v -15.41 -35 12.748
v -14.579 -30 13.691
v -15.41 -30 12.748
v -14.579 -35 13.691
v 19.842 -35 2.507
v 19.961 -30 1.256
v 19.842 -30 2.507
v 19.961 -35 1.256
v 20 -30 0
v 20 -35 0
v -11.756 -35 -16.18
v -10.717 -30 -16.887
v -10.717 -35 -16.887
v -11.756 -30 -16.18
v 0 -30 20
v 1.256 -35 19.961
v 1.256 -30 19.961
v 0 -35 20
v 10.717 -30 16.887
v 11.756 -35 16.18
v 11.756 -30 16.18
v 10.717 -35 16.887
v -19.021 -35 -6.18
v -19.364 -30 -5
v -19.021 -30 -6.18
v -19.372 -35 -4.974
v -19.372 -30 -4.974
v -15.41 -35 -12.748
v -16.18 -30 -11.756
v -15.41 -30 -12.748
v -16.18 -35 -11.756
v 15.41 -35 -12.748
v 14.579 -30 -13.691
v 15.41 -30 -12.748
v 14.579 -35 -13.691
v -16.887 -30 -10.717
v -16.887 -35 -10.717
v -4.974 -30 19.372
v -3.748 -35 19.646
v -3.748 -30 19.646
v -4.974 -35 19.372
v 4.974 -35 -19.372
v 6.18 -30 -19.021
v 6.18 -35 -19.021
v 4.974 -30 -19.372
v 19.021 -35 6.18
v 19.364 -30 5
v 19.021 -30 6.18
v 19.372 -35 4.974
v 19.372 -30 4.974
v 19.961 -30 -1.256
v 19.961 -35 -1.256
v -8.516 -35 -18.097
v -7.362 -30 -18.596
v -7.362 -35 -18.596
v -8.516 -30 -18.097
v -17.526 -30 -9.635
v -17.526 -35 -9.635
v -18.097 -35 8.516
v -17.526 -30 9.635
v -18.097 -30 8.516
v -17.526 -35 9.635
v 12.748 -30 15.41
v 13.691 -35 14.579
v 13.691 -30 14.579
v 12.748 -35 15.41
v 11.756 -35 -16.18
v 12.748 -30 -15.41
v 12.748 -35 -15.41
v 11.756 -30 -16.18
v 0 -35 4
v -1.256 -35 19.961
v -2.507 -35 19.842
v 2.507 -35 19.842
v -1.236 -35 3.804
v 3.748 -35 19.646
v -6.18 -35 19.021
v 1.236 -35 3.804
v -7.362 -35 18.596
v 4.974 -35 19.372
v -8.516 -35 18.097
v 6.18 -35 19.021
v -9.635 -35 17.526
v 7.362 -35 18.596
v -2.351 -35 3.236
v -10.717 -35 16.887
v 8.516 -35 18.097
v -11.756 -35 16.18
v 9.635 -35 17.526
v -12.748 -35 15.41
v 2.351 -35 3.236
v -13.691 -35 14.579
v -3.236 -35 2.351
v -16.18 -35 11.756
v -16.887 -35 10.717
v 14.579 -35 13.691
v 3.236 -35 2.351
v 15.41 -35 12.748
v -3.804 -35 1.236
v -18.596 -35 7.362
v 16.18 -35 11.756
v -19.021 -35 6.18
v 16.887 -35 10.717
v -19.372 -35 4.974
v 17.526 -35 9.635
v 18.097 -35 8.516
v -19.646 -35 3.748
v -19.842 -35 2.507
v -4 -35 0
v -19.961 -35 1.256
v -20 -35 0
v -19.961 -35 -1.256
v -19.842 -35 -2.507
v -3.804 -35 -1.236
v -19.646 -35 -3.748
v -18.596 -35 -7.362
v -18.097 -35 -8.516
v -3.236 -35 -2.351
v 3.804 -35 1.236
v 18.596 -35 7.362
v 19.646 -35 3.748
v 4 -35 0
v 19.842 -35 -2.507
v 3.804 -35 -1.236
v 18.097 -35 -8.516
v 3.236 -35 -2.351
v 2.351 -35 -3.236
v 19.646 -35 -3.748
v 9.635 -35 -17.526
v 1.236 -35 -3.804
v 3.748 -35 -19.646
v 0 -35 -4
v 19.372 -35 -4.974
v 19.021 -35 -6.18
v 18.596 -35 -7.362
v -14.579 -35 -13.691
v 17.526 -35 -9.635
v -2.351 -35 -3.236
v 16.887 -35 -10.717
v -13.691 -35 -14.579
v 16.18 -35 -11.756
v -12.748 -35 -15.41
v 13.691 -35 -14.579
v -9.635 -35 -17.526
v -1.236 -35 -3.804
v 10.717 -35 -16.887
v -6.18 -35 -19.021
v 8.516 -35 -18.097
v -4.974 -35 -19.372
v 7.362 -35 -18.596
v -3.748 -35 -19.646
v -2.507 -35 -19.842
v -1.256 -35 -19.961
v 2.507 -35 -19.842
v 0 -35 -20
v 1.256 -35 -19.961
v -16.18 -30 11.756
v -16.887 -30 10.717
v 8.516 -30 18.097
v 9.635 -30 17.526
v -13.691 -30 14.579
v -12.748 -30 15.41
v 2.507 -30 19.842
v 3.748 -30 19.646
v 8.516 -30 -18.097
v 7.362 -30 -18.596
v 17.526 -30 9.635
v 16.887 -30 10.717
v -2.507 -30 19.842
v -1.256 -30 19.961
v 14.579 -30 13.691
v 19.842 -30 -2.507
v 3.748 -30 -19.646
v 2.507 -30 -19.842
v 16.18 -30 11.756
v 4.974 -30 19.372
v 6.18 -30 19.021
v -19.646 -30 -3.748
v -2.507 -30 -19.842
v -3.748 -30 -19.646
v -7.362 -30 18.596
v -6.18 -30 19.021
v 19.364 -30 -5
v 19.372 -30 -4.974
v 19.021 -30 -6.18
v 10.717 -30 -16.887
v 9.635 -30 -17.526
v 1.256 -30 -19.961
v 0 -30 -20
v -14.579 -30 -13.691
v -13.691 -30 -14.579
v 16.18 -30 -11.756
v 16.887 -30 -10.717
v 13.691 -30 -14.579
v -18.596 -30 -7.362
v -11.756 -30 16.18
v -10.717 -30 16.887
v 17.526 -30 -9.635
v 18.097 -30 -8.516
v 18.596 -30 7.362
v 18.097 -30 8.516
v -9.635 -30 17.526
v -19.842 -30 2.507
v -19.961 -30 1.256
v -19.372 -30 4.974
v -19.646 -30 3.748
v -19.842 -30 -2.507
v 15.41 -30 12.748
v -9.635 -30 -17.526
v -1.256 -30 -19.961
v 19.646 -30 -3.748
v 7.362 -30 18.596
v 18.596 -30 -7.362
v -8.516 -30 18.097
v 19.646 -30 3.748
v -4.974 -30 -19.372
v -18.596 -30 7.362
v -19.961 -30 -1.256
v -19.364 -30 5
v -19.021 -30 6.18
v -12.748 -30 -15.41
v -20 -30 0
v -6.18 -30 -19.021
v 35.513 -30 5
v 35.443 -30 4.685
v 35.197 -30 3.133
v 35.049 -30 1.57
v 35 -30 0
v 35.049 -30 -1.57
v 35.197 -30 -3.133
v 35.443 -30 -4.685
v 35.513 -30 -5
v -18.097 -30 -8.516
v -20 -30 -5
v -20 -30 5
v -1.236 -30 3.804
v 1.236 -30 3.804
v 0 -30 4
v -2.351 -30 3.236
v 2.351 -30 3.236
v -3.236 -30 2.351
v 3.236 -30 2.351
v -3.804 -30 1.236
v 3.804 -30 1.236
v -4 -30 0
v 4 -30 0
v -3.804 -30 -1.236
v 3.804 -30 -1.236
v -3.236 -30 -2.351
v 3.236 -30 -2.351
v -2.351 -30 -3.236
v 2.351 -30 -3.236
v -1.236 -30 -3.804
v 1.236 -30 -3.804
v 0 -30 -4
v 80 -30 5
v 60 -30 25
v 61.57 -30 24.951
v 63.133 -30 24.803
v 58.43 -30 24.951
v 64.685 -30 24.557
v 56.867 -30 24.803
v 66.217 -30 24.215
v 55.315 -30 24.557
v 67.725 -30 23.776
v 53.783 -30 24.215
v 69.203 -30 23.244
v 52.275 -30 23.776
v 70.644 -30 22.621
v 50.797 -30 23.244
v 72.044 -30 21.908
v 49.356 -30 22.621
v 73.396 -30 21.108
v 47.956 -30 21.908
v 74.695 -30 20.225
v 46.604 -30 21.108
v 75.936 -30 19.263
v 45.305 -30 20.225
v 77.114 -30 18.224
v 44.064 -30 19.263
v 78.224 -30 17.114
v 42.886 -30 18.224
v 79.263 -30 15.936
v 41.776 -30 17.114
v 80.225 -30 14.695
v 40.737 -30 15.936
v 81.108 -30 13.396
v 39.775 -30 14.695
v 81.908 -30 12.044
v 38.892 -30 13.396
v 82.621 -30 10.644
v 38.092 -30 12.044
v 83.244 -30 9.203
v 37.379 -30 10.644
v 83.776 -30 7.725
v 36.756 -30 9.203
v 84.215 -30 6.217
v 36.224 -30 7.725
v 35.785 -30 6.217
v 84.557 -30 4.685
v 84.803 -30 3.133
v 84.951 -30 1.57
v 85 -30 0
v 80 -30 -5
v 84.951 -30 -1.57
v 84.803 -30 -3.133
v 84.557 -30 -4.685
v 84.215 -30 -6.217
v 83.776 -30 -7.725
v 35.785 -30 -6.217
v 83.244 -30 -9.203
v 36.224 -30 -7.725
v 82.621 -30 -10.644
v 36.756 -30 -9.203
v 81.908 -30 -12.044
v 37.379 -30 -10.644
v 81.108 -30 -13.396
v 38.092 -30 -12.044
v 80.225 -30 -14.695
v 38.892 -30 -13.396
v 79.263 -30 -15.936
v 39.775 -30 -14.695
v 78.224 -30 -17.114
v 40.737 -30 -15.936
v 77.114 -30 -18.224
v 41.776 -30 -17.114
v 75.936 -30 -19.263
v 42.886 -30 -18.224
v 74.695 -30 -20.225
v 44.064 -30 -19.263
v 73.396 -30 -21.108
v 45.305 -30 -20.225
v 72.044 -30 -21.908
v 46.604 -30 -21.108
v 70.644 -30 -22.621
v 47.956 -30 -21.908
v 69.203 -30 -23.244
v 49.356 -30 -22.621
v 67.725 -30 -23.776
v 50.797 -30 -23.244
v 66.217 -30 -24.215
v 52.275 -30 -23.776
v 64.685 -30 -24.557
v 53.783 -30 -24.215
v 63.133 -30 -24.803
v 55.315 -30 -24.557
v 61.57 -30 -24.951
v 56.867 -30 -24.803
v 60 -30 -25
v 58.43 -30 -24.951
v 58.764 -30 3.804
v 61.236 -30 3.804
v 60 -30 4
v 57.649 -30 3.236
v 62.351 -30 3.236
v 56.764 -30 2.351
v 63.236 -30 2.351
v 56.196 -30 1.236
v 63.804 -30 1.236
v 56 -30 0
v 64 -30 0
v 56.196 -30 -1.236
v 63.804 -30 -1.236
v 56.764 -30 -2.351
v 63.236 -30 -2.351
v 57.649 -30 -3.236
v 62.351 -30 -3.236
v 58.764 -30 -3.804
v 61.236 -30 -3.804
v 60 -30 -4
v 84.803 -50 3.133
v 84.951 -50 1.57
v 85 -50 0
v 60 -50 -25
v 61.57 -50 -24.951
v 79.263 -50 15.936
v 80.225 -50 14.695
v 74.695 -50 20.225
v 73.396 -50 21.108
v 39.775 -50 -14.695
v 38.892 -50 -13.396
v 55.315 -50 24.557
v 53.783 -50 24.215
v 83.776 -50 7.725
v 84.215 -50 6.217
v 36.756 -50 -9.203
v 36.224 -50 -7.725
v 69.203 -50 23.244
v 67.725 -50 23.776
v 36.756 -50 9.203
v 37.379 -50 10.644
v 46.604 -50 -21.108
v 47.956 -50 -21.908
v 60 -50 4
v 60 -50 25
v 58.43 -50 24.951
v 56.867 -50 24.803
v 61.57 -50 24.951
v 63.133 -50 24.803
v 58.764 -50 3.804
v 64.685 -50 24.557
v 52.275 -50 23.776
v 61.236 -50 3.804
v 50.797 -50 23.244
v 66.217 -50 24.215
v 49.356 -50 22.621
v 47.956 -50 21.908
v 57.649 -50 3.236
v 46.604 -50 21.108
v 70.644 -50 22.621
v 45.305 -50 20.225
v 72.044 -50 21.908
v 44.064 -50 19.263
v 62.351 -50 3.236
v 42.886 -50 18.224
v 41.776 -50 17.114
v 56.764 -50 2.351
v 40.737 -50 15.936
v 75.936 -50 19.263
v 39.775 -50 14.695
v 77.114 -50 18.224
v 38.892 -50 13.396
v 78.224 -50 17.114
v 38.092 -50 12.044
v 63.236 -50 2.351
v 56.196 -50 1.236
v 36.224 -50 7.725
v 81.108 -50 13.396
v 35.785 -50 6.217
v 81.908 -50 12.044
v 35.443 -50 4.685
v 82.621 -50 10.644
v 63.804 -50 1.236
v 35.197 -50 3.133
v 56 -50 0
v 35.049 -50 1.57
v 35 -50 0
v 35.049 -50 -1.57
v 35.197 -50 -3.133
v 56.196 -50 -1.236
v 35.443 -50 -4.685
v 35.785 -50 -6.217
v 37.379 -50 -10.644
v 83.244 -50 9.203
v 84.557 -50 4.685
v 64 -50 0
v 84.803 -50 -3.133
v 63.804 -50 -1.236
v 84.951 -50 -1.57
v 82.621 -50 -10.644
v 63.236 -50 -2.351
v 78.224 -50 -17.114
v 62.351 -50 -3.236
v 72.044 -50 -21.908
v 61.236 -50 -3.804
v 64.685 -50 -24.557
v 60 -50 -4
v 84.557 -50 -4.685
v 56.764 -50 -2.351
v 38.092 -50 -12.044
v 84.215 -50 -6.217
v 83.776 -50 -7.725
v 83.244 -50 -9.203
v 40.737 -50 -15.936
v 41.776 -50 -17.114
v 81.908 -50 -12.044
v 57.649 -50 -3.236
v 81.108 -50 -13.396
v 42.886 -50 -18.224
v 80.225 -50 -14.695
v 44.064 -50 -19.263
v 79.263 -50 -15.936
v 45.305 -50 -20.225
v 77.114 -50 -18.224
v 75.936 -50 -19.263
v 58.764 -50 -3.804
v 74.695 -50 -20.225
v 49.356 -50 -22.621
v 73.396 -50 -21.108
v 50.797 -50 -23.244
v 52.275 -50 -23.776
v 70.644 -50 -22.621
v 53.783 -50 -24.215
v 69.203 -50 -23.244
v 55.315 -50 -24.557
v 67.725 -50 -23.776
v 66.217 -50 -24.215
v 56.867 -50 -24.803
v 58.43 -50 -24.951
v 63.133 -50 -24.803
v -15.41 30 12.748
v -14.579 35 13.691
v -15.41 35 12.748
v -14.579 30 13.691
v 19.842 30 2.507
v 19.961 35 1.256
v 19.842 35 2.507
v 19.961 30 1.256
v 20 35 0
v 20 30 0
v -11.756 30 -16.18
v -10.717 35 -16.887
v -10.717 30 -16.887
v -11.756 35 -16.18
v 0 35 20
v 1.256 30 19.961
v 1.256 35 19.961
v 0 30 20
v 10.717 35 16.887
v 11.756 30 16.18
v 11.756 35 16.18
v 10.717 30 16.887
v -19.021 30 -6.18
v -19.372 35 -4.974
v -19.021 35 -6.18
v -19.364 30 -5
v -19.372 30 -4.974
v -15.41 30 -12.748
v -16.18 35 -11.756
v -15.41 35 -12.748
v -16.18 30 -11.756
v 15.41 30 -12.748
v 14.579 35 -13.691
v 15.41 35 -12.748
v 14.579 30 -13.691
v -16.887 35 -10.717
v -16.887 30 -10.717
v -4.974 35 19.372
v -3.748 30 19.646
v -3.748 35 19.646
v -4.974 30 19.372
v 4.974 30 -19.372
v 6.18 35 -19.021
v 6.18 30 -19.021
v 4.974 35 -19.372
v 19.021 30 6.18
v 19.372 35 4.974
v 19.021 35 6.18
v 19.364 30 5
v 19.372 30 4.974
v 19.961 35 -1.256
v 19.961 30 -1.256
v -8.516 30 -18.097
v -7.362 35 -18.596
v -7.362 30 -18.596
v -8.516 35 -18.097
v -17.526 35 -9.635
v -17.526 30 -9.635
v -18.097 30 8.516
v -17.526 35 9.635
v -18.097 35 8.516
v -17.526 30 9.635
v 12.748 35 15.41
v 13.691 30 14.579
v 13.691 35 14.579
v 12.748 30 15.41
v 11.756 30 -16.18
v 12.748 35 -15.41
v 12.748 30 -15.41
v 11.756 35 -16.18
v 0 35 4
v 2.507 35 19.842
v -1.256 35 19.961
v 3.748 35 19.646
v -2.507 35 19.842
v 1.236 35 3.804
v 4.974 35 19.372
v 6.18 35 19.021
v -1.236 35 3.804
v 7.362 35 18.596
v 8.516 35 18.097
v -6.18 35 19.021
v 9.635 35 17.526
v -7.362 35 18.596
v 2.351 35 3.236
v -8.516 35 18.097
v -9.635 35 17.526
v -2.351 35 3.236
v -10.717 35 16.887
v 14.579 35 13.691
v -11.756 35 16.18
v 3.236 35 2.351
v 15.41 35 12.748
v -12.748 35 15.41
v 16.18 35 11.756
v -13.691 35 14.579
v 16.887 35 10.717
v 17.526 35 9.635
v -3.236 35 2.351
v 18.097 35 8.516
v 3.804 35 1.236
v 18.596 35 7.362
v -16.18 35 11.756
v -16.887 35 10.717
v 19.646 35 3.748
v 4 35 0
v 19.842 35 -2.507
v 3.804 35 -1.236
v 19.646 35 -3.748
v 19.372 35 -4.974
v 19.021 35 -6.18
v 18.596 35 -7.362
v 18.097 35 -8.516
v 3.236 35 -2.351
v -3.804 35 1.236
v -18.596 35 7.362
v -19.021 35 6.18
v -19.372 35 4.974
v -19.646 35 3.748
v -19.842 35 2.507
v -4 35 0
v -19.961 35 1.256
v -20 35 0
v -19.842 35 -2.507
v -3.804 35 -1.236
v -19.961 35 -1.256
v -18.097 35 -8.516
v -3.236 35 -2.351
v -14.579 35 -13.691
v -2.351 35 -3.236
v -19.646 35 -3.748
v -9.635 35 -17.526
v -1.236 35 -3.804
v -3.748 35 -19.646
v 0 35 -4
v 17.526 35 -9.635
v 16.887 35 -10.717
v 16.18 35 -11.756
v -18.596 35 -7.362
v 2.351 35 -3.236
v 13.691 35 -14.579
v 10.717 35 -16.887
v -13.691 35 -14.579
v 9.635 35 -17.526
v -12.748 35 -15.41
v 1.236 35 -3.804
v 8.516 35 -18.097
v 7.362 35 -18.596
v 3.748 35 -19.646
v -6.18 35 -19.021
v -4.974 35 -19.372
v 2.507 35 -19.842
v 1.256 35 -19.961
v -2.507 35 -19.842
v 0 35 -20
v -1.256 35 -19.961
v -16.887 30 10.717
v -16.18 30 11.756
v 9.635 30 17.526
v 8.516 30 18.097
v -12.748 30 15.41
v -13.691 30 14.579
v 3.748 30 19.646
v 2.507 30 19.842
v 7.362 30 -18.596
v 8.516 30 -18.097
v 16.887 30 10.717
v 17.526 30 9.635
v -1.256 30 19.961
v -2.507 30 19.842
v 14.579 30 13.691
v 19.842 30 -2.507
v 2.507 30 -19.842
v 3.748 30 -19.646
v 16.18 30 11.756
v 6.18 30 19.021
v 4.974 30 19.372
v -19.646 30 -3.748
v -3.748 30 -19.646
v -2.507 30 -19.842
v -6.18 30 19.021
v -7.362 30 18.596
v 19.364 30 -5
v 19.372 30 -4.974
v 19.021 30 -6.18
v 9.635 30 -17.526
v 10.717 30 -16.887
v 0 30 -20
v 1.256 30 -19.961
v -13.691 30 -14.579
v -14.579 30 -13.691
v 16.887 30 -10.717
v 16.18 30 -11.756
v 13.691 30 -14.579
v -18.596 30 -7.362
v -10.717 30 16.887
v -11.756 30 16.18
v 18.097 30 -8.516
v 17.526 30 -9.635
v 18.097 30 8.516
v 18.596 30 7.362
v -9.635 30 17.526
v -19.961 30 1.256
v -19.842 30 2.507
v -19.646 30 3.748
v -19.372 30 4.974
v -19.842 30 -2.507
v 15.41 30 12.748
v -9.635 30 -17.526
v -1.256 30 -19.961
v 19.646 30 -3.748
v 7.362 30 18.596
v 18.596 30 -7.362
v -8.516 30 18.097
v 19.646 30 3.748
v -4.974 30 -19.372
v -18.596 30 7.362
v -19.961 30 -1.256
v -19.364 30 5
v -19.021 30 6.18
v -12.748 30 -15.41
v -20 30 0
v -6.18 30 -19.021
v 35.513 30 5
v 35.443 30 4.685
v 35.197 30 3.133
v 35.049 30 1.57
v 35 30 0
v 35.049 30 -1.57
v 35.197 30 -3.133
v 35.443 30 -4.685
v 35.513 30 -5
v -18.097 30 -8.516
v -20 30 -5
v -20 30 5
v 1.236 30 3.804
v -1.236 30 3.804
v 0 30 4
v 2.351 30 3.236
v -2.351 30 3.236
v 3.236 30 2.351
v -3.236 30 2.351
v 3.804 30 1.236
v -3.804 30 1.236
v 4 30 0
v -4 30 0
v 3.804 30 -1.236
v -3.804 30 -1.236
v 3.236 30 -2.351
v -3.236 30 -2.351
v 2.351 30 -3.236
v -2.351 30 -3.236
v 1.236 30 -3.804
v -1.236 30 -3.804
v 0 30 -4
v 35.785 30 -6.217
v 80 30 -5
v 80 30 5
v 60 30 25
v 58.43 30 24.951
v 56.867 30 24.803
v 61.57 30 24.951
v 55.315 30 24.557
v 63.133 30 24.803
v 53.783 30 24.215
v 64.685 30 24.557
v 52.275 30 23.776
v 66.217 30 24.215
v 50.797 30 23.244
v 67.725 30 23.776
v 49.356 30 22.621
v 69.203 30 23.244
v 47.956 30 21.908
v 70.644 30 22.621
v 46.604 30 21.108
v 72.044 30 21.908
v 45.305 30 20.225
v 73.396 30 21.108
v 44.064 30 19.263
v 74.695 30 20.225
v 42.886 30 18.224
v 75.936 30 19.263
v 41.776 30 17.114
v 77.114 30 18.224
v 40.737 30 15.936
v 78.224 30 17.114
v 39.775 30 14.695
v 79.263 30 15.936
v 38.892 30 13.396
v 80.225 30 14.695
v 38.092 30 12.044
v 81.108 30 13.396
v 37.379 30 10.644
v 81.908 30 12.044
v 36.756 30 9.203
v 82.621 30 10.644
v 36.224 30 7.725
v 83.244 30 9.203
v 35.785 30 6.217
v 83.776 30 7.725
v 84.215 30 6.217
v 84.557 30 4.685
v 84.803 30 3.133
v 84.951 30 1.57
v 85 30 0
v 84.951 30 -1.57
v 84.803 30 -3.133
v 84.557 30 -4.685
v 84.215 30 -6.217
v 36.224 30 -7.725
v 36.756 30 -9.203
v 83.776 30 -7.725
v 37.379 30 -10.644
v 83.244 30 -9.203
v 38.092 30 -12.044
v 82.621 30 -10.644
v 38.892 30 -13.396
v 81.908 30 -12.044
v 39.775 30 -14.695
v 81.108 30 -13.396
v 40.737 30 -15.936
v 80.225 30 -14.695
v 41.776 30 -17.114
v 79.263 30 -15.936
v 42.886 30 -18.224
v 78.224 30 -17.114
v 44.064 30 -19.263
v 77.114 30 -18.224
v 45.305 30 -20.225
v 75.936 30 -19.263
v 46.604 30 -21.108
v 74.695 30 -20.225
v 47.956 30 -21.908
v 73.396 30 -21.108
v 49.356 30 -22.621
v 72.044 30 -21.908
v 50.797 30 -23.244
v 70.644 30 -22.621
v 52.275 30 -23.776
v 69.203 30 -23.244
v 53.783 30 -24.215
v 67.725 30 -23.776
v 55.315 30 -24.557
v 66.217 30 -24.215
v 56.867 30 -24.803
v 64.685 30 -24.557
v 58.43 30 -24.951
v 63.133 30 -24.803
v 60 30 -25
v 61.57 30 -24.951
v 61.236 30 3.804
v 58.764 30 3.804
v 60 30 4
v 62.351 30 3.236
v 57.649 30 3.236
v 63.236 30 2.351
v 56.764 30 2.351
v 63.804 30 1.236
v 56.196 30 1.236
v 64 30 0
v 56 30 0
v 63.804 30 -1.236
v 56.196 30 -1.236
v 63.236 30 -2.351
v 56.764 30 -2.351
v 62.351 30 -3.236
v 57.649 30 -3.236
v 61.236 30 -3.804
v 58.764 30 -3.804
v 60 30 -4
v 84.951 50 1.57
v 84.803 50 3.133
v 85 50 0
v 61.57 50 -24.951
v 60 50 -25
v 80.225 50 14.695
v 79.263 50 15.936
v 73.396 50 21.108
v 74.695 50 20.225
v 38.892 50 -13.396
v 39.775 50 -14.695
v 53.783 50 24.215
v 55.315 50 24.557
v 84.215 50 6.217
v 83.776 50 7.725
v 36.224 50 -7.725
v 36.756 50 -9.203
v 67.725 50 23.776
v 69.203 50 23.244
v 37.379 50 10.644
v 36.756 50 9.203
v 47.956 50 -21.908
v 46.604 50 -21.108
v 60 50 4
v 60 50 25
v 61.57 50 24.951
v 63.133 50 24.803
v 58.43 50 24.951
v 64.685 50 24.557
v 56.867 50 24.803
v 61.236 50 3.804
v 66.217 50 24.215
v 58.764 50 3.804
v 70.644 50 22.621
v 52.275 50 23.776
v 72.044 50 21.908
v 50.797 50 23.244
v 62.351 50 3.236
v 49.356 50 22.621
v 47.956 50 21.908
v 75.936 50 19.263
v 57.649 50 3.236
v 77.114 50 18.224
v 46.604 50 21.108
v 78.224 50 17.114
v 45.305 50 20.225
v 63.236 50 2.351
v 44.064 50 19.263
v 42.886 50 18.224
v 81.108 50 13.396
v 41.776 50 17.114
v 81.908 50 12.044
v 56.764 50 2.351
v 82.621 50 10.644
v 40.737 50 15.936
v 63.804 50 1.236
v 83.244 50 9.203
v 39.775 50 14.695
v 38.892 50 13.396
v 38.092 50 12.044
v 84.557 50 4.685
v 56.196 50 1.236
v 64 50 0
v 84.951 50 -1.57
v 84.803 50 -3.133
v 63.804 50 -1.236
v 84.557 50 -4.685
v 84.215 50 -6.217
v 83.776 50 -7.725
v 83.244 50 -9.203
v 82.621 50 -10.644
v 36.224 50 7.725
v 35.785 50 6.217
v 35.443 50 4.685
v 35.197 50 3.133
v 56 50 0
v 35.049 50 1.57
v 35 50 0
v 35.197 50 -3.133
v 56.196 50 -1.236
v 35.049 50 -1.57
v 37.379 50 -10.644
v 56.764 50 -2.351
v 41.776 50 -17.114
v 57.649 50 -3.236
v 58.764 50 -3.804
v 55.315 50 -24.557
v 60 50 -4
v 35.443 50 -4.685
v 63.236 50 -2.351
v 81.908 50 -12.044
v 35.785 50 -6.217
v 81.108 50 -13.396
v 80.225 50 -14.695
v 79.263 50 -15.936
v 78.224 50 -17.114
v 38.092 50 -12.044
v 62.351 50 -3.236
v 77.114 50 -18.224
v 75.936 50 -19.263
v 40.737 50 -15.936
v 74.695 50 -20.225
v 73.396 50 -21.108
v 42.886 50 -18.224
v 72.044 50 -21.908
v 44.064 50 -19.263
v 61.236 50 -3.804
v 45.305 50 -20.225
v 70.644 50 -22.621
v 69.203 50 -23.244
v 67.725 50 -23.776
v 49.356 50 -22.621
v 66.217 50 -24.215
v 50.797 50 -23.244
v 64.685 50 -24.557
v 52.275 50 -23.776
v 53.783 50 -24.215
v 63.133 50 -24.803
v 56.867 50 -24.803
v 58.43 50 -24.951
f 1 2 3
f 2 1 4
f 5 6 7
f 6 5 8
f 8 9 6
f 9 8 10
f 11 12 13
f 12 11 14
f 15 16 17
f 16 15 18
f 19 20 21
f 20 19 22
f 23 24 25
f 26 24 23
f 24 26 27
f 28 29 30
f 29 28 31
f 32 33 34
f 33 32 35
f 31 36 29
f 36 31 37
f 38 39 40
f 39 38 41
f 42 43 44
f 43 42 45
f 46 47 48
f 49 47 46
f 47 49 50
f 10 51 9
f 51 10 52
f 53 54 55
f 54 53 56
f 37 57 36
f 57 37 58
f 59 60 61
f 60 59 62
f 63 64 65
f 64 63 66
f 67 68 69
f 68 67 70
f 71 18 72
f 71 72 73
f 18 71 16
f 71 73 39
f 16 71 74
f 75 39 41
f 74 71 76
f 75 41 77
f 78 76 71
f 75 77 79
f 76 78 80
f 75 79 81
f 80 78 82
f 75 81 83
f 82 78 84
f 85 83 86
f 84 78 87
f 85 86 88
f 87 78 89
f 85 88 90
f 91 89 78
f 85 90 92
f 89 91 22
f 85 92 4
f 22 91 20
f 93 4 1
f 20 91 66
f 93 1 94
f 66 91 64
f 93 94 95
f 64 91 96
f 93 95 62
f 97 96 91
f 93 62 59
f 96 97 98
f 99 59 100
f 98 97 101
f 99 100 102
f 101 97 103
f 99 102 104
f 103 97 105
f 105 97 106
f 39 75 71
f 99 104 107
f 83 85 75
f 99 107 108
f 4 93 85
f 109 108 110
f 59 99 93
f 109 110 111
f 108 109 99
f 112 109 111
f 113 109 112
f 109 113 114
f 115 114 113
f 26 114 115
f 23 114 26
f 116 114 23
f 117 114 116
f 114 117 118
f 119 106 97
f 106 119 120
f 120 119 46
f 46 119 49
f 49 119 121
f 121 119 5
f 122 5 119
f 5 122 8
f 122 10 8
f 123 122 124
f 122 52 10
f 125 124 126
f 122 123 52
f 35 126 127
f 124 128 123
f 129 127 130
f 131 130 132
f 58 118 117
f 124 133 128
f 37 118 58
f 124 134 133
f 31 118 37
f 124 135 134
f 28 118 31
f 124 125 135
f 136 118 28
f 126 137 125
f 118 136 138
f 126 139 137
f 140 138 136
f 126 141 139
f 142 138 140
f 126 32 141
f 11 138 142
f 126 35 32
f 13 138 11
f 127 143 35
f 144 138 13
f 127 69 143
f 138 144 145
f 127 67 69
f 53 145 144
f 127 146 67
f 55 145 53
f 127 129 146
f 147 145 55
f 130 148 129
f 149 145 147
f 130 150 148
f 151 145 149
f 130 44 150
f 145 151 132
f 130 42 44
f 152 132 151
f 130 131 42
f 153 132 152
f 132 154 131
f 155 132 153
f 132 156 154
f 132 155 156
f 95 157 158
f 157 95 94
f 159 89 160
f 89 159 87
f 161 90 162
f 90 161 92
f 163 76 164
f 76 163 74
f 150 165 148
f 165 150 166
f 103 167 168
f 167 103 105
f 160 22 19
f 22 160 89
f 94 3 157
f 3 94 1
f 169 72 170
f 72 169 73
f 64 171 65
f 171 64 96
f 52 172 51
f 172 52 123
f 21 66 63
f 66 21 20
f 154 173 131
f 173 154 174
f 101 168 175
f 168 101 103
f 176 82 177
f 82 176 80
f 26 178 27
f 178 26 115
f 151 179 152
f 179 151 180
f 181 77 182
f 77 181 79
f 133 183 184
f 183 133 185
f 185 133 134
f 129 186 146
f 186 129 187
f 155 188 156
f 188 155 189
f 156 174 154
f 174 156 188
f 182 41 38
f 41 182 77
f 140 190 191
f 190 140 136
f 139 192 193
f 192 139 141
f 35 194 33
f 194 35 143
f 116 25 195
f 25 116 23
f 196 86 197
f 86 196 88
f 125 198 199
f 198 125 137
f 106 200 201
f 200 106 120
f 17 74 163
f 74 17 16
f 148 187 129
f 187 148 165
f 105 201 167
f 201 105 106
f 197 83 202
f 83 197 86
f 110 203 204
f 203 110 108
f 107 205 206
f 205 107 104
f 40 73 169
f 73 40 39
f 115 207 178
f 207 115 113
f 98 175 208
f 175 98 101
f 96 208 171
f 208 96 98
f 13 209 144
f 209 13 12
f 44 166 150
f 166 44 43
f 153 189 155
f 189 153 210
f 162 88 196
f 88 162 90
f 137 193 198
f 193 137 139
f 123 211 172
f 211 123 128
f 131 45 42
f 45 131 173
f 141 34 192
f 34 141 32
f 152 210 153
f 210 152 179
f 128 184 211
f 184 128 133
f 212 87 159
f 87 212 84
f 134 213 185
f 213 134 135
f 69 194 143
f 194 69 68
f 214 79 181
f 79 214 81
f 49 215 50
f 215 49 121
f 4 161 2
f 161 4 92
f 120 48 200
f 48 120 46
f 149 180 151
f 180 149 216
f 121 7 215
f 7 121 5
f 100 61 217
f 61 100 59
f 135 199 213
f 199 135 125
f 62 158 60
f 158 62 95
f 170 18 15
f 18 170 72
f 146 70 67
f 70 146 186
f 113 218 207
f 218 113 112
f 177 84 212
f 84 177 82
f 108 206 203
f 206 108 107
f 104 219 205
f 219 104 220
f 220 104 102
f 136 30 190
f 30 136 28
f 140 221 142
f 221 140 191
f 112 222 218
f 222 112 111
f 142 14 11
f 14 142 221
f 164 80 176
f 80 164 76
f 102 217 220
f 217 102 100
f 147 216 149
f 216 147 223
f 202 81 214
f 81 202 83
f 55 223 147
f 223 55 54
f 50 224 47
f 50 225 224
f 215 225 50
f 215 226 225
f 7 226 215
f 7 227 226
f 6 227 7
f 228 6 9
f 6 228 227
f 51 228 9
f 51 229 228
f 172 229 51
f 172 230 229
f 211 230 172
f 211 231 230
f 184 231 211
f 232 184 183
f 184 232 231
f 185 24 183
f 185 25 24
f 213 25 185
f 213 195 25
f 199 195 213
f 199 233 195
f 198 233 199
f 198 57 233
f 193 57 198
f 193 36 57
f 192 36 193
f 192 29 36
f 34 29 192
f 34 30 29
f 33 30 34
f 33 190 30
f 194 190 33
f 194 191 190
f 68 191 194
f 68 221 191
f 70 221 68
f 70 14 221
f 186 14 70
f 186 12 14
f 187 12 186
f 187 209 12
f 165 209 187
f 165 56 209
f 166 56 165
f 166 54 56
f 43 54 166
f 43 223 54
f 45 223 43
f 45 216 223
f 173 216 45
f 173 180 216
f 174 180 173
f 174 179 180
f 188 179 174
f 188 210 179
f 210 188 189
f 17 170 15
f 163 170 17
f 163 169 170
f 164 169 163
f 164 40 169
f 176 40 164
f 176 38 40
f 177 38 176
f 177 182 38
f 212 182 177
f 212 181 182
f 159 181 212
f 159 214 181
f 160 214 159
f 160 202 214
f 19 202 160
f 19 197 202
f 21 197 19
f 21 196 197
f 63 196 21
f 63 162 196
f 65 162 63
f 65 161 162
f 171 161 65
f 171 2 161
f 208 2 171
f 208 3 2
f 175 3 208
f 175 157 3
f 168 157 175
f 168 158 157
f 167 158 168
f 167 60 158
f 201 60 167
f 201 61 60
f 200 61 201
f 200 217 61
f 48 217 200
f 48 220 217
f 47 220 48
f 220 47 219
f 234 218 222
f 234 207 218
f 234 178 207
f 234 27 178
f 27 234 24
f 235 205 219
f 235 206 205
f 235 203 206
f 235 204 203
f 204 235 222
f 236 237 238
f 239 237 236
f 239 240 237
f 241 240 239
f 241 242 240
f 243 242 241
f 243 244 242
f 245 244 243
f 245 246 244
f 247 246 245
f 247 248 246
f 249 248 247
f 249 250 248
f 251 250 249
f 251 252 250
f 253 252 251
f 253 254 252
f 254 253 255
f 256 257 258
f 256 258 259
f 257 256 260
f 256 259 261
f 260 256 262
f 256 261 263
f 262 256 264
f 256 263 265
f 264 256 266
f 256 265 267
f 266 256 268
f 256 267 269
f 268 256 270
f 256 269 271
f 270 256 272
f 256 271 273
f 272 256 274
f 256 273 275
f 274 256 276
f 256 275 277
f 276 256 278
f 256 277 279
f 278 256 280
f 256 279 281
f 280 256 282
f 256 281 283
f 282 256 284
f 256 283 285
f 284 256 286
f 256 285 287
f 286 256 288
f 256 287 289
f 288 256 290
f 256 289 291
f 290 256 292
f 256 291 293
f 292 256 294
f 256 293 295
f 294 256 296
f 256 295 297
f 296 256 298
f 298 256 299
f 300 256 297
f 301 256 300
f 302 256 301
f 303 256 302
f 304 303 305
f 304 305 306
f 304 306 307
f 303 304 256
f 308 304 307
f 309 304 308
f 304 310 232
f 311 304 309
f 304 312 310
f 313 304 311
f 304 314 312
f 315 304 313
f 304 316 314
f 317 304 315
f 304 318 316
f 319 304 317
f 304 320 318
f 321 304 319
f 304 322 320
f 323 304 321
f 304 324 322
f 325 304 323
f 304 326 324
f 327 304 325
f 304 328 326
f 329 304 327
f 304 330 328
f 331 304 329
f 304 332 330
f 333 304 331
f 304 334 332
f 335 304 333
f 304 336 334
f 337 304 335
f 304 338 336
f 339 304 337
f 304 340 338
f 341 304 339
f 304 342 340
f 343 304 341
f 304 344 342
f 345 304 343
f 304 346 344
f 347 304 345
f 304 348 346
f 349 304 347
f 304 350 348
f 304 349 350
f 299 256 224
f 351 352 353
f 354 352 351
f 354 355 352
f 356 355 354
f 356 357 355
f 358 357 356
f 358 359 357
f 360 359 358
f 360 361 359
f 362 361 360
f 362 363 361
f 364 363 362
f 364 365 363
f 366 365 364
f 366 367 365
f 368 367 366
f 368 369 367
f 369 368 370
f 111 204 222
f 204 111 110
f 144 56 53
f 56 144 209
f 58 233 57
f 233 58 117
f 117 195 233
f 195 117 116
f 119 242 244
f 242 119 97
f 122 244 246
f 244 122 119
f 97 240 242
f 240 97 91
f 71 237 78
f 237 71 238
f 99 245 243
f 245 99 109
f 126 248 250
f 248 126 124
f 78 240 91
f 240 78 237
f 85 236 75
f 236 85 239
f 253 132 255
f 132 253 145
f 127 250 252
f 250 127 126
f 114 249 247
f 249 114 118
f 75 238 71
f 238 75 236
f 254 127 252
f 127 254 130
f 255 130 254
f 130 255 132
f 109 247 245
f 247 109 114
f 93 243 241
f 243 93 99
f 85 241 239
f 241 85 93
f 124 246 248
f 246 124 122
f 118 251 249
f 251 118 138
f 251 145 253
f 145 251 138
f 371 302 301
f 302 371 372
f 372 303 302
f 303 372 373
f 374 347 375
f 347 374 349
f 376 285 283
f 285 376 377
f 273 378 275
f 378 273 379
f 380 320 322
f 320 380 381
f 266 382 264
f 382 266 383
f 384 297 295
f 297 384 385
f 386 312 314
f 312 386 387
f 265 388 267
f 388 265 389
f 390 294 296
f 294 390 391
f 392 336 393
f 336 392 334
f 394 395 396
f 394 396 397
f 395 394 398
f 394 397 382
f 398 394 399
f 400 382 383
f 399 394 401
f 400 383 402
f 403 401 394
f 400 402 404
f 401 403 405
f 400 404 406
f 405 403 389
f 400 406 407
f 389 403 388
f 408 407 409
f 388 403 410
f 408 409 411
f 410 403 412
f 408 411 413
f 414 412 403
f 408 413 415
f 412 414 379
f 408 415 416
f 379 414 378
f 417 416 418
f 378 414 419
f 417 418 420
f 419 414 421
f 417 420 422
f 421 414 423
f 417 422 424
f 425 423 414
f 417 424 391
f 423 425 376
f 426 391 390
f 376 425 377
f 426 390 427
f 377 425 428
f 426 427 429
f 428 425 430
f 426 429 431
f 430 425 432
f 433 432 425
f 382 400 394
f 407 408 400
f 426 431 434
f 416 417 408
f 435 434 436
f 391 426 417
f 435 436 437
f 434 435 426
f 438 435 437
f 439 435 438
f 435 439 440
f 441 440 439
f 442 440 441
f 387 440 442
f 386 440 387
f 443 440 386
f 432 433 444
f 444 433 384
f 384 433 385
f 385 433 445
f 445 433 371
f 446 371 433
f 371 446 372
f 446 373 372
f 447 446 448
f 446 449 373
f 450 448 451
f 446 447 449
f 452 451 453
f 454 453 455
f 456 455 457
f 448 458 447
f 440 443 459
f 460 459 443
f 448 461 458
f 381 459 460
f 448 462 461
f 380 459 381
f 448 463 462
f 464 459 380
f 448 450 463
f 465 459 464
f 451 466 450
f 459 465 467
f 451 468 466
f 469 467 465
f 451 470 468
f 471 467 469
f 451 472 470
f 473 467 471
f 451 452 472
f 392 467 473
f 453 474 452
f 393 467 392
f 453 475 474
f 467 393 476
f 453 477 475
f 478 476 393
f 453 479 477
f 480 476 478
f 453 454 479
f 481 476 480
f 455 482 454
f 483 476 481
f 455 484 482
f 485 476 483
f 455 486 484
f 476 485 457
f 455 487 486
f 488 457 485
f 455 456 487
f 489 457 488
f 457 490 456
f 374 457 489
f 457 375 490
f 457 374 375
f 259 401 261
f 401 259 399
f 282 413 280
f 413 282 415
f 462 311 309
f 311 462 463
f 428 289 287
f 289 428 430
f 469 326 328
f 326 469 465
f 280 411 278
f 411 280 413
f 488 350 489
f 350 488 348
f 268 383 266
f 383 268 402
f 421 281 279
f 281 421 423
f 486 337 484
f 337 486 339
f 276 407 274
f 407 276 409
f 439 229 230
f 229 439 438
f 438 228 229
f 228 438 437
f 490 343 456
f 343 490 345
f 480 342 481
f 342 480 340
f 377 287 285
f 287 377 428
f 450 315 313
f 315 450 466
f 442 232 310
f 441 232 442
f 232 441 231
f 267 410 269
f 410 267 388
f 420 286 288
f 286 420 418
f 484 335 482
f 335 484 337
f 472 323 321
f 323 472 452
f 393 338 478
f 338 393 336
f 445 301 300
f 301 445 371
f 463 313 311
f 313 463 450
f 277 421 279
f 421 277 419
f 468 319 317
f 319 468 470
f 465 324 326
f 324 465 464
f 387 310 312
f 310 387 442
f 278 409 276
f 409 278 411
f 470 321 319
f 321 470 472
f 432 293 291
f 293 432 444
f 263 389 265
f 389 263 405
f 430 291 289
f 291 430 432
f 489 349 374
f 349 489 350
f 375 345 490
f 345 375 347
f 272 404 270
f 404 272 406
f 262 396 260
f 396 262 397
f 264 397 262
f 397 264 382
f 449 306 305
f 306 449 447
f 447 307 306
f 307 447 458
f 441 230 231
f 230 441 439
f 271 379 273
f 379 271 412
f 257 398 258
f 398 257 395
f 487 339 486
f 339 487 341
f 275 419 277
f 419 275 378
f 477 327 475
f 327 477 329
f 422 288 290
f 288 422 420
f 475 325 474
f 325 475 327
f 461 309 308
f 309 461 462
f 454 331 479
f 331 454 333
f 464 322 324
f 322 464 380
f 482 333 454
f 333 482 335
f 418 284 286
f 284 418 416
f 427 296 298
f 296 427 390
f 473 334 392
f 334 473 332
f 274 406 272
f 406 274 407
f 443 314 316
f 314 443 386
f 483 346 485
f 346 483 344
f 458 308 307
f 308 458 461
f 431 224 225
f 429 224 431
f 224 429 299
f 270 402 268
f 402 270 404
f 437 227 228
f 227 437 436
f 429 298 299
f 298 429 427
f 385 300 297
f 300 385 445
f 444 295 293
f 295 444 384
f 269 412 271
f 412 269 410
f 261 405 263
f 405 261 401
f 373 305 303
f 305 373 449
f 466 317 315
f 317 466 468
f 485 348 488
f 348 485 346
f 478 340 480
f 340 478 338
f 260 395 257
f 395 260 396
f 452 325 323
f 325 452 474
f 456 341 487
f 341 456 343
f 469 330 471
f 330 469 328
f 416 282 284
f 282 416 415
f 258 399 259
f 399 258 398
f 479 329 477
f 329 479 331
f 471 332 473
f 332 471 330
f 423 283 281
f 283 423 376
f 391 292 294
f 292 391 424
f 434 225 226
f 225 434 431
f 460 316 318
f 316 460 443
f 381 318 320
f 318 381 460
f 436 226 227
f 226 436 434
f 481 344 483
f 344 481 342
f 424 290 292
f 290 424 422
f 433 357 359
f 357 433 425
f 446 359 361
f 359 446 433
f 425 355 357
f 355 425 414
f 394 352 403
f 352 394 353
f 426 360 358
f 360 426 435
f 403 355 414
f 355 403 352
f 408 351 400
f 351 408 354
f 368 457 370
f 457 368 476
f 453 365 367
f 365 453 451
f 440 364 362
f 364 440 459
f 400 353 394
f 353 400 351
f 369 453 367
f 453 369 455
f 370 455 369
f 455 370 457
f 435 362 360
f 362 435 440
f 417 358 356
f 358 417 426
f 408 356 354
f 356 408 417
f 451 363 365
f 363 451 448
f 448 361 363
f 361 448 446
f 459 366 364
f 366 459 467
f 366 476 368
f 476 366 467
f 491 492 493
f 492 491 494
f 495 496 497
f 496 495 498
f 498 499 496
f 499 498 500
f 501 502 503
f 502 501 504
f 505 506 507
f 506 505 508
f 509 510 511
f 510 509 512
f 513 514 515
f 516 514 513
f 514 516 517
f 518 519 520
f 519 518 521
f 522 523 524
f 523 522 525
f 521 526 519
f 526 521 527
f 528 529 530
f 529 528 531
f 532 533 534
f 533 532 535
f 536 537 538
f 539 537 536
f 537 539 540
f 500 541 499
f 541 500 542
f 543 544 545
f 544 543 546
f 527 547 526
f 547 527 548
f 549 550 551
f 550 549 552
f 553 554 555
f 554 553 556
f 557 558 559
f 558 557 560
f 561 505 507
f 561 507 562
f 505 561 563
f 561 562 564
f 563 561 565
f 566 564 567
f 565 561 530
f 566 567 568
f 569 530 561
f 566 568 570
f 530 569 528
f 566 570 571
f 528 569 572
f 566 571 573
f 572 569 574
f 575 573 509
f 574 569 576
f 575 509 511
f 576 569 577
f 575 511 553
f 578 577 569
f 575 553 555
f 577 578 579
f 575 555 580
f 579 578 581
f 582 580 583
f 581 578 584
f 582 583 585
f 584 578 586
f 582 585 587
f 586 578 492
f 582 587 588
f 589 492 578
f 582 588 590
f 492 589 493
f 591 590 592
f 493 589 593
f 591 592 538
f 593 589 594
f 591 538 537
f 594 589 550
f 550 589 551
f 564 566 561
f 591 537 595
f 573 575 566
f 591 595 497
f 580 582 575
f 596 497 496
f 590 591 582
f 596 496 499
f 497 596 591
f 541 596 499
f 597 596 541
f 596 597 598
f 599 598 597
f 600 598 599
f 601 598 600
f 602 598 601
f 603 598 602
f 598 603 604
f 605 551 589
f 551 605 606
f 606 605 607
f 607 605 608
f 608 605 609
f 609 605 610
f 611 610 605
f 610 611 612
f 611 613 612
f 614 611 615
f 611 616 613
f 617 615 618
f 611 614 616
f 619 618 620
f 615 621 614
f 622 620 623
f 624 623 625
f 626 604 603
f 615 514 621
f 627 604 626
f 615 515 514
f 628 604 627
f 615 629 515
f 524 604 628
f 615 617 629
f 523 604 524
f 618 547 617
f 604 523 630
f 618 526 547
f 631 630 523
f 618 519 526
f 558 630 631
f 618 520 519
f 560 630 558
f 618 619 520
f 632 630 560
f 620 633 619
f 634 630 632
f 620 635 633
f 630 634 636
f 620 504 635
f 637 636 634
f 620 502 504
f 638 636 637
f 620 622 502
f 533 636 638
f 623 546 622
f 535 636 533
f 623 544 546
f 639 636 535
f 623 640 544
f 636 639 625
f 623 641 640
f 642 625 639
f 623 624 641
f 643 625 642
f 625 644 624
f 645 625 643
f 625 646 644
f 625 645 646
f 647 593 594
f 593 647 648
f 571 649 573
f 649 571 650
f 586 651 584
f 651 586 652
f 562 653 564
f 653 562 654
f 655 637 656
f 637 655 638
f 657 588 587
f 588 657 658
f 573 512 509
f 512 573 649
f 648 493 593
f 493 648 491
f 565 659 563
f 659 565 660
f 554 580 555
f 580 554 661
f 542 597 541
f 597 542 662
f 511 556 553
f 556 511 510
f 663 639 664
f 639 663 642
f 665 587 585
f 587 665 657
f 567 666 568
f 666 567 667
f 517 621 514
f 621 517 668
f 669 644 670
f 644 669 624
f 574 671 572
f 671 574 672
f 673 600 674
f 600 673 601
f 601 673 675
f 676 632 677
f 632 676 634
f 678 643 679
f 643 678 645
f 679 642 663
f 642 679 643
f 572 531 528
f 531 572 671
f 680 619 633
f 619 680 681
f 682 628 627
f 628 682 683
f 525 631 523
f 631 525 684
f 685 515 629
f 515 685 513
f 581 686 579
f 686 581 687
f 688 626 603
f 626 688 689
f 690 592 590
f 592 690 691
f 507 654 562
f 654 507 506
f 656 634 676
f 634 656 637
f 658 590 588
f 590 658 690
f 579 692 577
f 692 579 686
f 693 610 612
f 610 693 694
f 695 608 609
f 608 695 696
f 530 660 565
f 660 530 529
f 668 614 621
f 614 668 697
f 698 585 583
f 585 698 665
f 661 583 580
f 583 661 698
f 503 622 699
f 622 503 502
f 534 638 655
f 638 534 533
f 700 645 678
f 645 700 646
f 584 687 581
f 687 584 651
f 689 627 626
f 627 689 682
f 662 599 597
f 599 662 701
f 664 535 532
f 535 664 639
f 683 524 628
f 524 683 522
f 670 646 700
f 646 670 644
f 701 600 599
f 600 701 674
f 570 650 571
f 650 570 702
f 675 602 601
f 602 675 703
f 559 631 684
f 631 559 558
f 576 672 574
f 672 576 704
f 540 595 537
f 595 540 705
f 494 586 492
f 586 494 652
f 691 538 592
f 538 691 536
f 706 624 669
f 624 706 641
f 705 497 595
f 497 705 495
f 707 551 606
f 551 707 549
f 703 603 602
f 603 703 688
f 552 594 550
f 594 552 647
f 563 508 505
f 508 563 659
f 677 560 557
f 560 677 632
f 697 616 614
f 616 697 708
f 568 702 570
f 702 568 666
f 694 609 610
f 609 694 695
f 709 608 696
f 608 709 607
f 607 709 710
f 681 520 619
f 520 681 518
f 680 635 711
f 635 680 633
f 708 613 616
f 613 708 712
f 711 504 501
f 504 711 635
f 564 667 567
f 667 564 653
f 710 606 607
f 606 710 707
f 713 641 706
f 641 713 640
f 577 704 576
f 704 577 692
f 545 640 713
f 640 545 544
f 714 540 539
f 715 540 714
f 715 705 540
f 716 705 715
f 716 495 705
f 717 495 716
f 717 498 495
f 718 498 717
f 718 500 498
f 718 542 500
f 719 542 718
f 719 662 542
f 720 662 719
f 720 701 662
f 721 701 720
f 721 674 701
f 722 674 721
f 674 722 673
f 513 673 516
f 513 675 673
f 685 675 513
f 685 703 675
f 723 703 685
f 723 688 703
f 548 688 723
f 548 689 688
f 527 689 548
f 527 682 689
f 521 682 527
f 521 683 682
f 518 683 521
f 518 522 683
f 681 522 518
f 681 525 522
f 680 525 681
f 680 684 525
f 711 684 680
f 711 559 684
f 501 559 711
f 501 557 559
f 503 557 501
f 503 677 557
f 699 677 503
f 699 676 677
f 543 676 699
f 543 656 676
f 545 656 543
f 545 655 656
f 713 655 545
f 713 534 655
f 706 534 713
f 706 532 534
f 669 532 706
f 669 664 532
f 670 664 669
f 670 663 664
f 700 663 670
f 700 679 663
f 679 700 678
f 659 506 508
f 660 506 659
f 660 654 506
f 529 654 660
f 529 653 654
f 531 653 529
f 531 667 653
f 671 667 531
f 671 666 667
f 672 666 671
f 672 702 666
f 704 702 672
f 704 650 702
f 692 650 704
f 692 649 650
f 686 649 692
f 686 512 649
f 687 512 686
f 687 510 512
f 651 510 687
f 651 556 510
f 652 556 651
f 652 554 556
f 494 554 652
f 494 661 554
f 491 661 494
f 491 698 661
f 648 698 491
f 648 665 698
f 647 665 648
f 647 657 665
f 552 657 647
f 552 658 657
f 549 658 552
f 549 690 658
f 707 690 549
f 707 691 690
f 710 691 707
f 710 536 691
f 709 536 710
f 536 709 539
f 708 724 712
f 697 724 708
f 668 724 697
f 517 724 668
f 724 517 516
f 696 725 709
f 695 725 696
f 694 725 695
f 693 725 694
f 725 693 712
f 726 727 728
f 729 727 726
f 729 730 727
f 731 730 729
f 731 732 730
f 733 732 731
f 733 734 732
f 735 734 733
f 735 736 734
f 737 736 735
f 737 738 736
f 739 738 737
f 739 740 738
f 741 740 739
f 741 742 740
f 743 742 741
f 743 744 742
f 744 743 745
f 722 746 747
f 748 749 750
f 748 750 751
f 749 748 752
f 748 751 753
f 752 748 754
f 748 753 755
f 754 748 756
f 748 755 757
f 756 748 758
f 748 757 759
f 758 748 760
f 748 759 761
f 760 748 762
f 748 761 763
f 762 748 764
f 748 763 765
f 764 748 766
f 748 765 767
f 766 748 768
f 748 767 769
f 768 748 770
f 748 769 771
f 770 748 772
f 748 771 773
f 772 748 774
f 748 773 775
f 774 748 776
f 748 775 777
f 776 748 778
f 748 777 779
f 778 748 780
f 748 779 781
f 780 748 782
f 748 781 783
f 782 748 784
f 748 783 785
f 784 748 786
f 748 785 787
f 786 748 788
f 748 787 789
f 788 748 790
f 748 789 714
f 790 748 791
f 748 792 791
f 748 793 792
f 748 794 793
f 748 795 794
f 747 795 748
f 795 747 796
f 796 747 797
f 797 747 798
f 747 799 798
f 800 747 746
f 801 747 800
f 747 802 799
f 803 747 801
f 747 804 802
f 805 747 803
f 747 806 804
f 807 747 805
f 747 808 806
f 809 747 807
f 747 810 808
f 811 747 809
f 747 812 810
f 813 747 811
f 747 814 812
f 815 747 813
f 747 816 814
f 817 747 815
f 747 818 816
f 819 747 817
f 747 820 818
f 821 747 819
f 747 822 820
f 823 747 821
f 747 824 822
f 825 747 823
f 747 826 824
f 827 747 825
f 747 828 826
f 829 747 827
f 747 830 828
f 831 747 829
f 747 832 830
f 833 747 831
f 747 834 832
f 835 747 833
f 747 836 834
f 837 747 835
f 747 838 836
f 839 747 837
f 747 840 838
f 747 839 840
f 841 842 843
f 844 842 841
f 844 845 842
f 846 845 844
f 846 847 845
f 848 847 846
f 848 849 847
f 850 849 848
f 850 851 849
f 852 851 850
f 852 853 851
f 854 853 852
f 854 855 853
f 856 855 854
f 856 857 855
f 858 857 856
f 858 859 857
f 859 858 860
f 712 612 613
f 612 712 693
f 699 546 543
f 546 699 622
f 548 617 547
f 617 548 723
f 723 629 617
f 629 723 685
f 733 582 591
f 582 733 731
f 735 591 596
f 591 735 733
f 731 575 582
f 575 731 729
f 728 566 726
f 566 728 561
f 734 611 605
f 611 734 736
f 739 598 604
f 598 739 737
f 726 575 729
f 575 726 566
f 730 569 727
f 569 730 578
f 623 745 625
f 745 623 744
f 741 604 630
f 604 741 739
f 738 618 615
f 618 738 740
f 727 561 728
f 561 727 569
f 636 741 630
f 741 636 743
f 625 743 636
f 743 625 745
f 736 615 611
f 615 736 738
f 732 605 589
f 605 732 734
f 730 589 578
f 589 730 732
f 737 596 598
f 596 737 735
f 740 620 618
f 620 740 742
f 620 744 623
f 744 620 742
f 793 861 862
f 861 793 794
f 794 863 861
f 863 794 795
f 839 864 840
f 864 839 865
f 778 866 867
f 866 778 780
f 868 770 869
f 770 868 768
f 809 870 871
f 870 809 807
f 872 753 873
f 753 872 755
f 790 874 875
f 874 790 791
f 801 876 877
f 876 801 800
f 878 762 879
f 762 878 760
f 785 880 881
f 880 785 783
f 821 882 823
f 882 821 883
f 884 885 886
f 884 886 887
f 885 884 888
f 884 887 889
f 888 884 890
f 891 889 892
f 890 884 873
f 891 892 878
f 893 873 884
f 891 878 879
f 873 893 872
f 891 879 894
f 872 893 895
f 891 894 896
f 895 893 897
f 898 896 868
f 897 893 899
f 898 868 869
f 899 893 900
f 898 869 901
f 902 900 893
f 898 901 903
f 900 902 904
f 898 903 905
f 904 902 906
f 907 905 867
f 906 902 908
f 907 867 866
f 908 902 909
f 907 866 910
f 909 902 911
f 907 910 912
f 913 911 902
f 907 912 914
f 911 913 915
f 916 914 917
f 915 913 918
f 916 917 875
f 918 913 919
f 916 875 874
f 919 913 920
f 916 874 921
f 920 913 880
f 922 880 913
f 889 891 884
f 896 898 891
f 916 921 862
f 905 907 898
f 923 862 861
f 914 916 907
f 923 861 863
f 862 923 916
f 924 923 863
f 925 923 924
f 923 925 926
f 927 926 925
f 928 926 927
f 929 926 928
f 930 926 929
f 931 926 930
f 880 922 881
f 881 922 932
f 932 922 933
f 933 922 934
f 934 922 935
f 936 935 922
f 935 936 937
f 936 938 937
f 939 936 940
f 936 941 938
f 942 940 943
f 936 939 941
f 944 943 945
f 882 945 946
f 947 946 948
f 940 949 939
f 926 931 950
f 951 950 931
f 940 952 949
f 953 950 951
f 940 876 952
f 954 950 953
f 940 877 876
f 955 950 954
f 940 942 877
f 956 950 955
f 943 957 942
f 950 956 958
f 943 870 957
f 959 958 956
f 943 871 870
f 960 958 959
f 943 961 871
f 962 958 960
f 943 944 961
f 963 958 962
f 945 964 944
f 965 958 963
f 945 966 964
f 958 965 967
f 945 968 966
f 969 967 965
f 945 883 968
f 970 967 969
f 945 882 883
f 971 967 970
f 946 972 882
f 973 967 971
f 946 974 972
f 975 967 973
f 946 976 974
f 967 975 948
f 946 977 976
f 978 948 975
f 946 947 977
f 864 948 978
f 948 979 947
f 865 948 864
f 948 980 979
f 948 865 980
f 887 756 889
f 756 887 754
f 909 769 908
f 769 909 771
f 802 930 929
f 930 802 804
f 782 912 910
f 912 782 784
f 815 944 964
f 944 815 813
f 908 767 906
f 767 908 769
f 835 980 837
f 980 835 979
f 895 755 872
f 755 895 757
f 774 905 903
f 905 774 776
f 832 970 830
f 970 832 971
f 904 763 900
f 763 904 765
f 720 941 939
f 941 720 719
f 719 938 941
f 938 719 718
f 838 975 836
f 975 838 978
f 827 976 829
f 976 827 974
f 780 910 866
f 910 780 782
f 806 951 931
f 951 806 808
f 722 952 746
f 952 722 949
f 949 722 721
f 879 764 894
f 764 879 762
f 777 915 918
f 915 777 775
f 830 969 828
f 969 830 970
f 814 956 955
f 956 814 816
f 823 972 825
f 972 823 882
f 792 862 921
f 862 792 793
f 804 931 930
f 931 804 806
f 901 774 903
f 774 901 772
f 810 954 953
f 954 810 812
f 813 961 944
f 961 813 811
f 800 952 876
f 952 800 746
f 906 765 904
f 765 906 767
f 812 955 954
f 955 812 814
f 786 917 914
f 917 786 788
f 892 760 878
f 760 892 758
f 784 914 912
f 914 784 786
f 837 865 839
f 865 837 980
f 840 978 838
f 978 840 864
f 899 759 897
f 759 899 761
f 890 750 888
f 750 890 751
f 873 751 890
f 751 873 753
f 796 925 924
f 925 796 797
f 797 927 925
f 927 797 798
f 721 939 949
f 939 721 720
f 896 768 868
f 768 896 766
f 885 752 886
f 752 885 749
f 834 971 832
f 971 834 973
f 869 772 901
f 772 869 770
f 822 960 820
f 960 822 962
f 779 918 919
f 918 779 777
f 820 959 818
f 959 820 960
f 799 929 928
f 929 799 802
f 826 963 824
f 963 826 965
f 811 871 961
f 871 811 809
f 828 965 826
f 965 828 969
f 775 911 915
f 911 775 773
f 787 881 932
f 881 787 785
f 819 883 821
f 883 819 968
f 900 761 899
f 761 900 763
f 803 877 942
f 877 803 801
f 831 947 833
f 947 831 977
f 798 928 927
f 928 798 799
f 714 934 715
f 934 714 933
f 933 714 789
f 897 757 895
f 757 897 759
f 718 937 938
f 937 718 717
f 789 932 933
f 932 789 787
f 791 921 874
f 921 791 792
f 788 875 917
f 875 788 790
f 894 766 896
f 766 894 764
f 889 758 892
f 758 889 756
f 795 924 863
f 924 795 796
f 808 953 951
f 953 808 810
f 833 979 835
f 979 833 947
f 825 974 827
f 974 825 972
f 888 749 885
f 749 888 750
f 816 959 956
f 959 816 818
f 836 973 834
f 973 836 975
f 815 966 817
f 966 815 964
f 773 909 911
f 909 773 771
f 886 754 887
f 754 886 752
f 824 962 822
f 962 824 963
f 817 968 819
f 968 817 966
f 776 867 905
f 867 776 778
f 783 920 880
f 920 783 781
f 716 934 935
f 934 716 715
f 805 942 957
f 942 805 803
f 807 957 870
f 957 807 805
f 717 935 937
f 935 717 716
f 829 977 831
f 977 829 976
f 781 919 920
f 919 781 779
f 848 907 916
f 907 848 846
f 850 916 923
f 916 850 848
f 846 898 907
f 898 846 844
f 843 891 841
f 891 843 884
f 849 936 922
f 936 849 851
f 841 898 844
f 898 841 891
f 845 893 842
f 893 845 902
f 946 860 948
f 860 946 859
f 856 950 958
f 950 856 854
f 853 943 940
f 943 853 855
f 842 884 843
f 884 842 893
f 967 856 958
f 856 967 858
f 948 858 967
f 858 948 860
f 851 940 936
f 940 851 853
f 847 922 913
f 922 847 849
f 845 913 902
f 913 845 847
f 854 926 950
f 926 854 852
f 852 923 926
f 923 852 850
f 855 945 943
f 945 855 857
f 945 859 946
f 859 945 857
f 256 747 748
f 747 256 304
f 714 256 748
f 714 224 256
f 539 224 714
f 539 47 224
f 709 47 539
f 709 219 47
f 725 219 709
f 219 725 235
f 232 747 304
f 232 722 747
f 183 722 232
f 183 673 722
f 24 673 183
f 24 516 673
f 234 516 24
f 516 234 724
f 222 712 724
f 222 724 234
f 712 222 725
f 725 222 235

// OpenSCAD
// file: 8.Parametros por defecto.scad
module rueda_simple(grosor=5,diametro=40,diam_eje=8){
    //-- Construcción de la rueda a partir de los parámetros
    difference(){
        //-- Base de la rueda
        cylinder(r=diametro/2,h=grosor,$fn=100);
        
        //-- Taladro del eje
        cylinder(r=diam_eje/2,h=3*grosor,$fn=20,center=true);
    }
}

//-- Ejemplos de utilización del módulo rueda simple
//-- Rueda por defecto
rueda_simple();

translate([50,0,0])
    rueda_simple(grosor=20);

translate([-50,0,0])
    rueda_simple(diametro=20,grosor=10);
// main file
//-- Ejemplo sencillo de cómo utilizar los módulos
use <8.Parametros por defecto.scad>

//-- Chasis del coche
translate([30,0,0])
    cube([100,60,10], center=true);
    
//-- Rueda delantera izquierda
translate([0,-30,0])
    rotate([90,0,0])
        rueda_simple();
        
//-- Rueda trasera izquierda
translate([60,-30,0])
    rotate([90,0,0])
        rueda_simple(grosor=20,diametro=50);
        
//-- Lado derecho del coche. Simétrico respecto al izquierdo
mirror([0,1,0]){
    translate([0,-30,0])
        rotate([90,0,0])
            rueda_simple();
            
    translate([60,-30,0])
        rotate([90,0,0])
            rueda_simple(grosor=20,diametro=50);
}
